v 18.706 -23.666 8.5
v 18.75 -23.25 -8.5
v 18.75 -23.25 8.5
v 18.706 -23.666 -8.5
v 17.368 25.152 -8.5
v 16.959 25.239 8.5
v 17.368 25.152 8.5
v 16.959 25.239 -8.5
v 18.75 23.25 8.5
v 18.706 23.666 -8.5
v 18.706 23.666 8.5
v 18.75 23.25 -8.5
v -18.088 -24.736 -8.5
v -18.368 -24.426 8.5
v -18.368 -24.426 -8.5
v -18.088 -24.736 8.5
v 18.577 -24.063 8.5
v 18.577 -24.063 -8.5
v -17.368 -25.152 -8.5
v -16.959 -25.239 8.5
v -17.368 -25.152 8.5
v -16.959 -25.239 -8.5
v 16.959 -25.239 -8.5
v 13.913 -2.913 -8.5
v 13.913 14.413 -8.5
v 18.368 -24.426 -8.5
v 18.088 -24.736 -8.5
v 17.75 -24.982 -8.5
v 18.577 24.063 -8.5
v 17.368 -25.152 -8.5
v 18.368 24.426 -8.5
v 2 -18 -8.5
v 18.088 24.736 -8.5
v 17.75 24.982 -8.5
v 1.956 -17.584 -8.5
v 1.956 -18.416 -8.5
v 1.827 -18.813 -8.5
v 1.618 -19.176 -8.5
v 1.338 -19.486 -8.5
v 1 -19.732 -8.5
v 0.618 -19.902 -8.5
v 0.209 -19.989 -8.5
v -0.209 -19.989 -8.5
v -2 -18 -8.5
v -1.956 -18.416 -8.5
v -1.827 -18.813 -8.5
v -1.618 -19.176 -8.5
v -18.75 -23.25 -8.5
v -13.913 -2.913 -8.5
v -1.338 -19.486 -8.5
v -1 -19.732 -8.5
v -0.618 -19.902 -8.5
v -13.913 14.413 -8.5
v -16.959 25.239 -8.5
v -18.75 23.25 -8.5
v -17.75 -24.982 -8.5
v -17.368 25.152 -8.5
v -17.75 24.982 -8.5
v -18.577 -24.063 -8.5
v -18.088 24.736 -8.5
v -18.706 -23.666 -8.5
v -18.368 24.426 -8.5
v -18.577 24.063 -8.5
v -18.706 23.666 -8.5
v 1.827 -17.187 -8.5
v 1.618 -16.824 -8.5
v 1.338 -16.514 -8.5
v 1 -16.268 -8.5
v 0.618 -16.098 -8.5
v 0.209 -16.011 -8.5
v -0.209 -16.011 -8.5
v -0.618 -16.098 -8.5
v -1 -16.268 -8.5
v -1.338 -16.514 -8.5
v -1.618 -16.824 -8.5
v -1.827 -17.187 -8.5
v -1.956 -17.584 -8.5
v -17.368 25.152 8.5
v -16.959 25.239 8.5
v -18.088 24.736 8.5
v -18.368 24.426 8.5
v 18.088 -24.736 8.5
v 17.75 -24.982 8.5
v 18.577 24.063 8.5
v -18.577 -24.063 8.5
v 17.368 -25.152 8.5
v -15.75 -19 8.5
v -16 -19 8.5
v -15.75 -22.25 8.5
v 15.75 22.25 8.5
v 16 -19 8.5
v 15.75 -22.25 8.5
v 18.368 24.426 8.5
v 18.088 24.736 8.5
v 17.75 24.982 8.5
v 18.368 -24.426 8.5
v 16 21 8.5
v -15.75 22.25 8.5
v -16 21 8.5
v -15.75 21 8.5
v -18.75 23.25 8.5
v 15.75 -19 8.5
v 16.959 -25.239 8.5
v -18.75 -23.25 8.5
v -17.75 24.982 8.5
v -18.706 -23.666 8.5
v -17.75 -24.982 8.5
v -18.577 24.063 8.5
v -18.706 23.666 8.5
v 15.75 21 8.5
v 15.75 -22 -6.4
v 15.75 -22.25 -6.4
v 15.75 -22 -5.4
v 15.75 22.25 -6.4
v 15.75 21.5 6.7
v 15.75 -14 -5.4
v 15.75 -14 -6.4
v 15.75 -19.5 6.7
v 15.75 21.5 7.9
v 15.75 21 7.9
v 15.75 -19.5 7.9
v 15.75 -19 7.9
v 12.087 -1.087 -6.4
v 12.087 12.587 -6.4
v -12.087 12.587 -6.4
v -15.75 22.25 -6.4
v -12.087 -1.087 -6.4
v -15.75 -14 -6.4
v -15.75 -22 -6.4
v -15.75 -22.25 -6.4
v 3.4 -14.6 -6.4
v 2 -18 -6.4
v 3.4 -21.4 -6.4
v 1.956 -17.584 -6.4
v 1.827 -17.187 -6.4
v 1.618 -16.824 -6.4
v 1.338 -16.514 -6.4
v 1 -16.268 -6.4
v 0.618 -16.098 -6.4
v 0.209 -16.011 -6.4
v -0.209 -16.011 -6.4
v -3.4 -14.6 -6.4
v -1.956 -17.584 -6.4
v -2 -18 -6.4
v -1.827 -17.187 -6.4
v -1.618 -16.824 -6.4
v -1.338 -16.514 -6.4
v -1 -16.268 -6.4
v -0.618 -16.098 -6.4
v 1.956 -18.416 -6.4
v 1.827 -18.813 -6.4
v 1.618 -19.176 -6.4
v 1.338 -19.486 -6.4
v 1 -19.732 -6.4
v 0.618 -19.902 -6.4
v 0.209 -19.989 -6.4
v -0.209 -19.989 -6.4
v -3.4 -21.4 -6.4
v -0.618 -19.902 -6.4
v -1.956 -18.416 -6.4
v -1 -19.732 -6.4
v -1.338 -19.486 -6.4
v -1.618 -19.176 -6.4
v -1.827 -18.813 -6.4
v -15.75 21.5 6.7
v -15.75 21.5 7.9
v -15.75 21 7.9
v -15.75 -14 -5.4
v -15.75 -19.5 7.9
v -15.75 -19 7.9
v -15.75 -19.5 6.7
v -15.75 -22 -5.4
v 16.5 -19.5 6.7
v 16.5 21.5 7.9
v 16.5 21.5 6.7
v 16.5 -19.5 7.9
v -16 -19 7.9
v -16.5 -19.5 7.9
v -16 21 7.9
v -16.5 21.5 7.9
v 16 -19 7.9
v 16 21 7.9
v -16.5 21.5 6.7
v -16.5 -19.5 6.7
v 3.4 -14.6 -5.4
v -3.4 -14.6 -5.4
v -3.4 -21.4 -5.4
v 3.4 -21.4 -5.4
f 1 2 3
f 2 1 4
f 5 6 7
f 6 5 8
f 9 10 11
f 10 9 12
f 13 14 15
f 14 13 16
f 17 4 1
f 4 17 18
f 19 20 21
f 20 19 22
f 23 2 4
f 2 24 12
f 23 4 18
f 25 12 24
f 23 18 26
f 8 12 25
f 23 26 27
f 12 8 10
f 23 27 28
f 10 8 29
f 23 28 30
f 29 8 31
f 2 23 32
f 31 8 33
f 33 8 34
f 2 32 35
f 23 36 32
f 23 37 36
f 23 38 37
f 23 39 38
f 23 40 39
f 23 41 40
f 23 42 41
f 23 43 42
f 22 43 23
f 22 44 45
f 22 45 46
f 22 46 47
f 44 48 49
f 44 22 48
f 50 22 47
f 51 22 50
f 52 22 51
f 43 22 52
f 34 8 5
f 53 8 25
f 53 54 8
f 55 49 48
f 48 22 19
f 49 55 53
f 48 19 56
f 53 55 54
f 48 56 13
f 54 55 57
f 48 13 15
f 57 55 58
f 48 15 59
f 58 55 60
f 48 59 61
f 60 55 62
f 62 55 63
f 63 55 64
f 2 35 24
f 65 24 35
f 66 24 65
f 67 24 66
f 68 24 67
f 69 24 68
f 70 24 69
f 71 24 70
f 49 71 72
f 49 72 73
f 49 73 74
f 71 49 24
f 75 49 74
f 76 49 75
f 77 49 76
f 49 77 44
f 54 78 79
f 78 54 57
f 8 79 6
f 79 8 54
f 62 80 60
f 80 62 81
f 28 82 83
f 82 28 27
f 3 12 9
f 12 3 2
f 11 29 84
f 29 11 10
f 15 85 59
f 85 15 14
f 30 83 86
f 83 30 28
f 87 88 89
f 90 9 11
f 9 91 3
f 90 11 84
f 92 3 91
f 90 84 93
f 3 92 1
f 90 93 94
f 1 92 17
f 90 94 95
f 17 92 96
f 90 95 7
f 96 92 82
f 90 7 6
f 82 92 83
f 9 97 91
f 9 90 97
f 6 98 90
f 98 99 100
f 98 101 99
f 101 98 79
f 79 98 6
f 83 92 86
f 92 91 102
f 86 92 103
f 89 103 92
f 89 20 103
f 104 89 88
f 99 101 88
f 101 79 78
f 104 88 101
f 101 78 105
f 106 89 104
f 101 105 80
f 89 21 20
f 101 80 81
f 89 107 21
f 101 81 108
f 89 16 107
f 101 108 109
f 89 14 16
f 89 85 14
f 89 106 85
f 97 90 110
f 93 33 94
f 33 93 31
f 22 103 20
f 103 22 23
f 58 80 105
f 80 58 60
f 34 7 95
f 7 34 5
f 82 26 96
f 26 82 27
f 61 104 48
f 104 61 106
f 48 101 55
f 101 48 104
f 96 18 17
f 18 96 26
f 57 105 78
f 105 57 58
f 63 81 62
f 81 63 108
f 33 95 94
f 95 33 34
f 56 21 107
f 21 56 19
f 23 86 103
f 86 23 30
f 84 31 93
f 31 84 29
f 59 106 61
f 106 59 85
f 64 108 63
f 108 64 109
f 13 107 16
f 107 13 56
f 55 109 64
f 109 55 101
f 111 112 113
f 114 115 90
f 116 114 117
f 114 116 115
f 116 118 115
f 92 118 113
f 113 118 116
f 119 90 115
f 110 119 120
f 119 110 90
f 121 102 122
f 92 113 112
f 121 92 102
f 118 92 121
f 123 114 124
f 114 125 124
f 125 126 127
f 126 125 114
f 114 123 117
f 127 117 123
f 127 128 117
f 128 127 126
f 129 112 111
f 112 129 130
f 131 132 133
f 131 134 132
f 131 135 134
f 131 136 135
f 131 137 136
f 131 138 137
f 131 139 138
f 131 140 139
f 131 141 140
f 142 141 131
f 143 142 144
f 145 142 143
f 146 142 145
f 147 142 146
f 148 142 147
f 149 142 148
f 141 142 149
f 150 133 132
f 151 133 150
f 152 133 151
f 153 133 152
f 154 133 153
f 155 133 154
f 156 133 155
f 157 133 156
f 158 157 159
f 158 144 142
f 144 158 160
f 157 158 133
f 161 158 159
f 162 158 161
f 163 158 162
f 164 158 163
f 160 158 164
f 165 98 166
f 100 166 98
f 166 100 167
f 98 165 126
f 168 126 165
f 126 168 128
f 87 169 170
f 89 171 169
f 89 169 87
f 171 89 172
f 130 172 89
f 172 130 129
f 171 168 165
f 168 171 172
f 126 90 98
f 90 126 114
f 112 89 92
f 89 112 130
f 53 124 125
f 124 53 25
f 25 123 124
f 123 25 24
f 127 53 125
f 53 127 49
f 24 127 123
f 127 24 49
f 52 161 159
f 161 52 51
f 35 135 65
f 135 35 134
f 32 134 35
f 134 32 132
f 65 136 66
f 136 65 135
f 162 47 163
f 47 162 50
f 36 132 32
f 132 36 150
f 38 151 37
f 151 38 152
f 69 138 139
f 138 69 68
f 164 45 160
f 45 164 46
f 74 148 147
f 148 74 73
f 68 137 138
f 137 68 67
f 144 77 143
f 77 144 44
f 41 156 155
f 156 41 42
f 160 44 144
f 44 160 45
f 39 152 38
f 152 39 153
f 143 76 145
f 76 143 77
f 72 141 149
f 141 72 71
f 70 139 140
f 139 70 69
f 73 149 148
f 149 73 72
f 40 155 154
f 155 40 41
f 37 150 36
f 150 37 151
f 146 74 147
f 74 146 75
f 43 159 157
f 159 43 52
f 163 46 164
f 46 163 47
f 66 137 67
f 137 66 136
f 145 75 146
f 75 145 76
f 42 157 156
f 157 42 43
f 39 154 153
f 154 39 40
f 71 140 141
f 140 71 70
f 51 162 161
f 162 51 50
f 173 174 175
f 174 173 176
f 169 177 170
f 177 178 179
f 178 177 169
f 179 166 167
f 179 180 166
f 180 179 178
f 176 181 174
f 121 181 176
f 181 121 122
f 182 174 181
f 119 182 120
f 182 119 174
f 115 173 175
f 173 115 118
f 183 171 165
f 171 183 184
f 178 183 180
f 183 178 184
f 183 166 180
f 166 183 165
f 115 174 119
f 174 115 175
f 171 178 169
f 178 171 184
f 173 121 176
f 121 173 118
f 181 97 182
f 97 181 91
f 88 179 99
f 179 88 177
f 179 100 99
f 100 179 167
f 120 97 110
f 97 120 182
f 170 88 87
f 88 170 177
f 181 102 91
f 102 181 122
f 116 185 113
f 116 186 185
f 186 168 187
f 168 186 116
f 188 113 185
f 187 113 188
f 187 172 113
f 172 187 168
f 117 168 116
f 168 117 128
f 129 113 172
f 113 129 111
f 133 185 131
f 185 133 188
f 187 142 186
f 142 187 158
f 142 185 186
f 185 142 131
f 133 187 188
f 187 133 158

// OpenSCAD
//OLED housing (0.96'' - SSD1306 display + WEMOS D1 mini)


spaceh=21.5;                                                  //Spacing vor mounting holes of OLED horizontally
spacev=21.5;                                                  //Spacing vor mounting holes of OLED vertically


$fn=30;

difference(){
 minkowski(){
  // Außen mit runder Kontur
  cube([33.5,46.5,15], center=true); 
   cylinder(r=2, h=2, center=true);
  }
  // Innen
  translate([0,0,1.1])
   cube([31.5,44.5,15],center=true);
  
  // Display
  hull(){
   translate([0,5.75,-7.8])
    cube([24,13.5,3],center=true);
   translate([0,5.75,-9.1])
    cube([28,17.5,1], center=true);
   }
    translate([0,-18,-7])cylinder(d=4, h=4, center=true);      //hole for push button
    translate([0,1,7.3])cube([33,41,1.2], center=true);        //groove for the lid
    translate([0,1,8.3])cube([32,40,1.2], center=true);        //groove for the lid
        //holu for USB
}

translate([0,-18,-5.9])difference(){                           //recess for push button
    cube([31.5,8,1], center=true);
    cube([6.8,6.8,1.2], center=true);
}
